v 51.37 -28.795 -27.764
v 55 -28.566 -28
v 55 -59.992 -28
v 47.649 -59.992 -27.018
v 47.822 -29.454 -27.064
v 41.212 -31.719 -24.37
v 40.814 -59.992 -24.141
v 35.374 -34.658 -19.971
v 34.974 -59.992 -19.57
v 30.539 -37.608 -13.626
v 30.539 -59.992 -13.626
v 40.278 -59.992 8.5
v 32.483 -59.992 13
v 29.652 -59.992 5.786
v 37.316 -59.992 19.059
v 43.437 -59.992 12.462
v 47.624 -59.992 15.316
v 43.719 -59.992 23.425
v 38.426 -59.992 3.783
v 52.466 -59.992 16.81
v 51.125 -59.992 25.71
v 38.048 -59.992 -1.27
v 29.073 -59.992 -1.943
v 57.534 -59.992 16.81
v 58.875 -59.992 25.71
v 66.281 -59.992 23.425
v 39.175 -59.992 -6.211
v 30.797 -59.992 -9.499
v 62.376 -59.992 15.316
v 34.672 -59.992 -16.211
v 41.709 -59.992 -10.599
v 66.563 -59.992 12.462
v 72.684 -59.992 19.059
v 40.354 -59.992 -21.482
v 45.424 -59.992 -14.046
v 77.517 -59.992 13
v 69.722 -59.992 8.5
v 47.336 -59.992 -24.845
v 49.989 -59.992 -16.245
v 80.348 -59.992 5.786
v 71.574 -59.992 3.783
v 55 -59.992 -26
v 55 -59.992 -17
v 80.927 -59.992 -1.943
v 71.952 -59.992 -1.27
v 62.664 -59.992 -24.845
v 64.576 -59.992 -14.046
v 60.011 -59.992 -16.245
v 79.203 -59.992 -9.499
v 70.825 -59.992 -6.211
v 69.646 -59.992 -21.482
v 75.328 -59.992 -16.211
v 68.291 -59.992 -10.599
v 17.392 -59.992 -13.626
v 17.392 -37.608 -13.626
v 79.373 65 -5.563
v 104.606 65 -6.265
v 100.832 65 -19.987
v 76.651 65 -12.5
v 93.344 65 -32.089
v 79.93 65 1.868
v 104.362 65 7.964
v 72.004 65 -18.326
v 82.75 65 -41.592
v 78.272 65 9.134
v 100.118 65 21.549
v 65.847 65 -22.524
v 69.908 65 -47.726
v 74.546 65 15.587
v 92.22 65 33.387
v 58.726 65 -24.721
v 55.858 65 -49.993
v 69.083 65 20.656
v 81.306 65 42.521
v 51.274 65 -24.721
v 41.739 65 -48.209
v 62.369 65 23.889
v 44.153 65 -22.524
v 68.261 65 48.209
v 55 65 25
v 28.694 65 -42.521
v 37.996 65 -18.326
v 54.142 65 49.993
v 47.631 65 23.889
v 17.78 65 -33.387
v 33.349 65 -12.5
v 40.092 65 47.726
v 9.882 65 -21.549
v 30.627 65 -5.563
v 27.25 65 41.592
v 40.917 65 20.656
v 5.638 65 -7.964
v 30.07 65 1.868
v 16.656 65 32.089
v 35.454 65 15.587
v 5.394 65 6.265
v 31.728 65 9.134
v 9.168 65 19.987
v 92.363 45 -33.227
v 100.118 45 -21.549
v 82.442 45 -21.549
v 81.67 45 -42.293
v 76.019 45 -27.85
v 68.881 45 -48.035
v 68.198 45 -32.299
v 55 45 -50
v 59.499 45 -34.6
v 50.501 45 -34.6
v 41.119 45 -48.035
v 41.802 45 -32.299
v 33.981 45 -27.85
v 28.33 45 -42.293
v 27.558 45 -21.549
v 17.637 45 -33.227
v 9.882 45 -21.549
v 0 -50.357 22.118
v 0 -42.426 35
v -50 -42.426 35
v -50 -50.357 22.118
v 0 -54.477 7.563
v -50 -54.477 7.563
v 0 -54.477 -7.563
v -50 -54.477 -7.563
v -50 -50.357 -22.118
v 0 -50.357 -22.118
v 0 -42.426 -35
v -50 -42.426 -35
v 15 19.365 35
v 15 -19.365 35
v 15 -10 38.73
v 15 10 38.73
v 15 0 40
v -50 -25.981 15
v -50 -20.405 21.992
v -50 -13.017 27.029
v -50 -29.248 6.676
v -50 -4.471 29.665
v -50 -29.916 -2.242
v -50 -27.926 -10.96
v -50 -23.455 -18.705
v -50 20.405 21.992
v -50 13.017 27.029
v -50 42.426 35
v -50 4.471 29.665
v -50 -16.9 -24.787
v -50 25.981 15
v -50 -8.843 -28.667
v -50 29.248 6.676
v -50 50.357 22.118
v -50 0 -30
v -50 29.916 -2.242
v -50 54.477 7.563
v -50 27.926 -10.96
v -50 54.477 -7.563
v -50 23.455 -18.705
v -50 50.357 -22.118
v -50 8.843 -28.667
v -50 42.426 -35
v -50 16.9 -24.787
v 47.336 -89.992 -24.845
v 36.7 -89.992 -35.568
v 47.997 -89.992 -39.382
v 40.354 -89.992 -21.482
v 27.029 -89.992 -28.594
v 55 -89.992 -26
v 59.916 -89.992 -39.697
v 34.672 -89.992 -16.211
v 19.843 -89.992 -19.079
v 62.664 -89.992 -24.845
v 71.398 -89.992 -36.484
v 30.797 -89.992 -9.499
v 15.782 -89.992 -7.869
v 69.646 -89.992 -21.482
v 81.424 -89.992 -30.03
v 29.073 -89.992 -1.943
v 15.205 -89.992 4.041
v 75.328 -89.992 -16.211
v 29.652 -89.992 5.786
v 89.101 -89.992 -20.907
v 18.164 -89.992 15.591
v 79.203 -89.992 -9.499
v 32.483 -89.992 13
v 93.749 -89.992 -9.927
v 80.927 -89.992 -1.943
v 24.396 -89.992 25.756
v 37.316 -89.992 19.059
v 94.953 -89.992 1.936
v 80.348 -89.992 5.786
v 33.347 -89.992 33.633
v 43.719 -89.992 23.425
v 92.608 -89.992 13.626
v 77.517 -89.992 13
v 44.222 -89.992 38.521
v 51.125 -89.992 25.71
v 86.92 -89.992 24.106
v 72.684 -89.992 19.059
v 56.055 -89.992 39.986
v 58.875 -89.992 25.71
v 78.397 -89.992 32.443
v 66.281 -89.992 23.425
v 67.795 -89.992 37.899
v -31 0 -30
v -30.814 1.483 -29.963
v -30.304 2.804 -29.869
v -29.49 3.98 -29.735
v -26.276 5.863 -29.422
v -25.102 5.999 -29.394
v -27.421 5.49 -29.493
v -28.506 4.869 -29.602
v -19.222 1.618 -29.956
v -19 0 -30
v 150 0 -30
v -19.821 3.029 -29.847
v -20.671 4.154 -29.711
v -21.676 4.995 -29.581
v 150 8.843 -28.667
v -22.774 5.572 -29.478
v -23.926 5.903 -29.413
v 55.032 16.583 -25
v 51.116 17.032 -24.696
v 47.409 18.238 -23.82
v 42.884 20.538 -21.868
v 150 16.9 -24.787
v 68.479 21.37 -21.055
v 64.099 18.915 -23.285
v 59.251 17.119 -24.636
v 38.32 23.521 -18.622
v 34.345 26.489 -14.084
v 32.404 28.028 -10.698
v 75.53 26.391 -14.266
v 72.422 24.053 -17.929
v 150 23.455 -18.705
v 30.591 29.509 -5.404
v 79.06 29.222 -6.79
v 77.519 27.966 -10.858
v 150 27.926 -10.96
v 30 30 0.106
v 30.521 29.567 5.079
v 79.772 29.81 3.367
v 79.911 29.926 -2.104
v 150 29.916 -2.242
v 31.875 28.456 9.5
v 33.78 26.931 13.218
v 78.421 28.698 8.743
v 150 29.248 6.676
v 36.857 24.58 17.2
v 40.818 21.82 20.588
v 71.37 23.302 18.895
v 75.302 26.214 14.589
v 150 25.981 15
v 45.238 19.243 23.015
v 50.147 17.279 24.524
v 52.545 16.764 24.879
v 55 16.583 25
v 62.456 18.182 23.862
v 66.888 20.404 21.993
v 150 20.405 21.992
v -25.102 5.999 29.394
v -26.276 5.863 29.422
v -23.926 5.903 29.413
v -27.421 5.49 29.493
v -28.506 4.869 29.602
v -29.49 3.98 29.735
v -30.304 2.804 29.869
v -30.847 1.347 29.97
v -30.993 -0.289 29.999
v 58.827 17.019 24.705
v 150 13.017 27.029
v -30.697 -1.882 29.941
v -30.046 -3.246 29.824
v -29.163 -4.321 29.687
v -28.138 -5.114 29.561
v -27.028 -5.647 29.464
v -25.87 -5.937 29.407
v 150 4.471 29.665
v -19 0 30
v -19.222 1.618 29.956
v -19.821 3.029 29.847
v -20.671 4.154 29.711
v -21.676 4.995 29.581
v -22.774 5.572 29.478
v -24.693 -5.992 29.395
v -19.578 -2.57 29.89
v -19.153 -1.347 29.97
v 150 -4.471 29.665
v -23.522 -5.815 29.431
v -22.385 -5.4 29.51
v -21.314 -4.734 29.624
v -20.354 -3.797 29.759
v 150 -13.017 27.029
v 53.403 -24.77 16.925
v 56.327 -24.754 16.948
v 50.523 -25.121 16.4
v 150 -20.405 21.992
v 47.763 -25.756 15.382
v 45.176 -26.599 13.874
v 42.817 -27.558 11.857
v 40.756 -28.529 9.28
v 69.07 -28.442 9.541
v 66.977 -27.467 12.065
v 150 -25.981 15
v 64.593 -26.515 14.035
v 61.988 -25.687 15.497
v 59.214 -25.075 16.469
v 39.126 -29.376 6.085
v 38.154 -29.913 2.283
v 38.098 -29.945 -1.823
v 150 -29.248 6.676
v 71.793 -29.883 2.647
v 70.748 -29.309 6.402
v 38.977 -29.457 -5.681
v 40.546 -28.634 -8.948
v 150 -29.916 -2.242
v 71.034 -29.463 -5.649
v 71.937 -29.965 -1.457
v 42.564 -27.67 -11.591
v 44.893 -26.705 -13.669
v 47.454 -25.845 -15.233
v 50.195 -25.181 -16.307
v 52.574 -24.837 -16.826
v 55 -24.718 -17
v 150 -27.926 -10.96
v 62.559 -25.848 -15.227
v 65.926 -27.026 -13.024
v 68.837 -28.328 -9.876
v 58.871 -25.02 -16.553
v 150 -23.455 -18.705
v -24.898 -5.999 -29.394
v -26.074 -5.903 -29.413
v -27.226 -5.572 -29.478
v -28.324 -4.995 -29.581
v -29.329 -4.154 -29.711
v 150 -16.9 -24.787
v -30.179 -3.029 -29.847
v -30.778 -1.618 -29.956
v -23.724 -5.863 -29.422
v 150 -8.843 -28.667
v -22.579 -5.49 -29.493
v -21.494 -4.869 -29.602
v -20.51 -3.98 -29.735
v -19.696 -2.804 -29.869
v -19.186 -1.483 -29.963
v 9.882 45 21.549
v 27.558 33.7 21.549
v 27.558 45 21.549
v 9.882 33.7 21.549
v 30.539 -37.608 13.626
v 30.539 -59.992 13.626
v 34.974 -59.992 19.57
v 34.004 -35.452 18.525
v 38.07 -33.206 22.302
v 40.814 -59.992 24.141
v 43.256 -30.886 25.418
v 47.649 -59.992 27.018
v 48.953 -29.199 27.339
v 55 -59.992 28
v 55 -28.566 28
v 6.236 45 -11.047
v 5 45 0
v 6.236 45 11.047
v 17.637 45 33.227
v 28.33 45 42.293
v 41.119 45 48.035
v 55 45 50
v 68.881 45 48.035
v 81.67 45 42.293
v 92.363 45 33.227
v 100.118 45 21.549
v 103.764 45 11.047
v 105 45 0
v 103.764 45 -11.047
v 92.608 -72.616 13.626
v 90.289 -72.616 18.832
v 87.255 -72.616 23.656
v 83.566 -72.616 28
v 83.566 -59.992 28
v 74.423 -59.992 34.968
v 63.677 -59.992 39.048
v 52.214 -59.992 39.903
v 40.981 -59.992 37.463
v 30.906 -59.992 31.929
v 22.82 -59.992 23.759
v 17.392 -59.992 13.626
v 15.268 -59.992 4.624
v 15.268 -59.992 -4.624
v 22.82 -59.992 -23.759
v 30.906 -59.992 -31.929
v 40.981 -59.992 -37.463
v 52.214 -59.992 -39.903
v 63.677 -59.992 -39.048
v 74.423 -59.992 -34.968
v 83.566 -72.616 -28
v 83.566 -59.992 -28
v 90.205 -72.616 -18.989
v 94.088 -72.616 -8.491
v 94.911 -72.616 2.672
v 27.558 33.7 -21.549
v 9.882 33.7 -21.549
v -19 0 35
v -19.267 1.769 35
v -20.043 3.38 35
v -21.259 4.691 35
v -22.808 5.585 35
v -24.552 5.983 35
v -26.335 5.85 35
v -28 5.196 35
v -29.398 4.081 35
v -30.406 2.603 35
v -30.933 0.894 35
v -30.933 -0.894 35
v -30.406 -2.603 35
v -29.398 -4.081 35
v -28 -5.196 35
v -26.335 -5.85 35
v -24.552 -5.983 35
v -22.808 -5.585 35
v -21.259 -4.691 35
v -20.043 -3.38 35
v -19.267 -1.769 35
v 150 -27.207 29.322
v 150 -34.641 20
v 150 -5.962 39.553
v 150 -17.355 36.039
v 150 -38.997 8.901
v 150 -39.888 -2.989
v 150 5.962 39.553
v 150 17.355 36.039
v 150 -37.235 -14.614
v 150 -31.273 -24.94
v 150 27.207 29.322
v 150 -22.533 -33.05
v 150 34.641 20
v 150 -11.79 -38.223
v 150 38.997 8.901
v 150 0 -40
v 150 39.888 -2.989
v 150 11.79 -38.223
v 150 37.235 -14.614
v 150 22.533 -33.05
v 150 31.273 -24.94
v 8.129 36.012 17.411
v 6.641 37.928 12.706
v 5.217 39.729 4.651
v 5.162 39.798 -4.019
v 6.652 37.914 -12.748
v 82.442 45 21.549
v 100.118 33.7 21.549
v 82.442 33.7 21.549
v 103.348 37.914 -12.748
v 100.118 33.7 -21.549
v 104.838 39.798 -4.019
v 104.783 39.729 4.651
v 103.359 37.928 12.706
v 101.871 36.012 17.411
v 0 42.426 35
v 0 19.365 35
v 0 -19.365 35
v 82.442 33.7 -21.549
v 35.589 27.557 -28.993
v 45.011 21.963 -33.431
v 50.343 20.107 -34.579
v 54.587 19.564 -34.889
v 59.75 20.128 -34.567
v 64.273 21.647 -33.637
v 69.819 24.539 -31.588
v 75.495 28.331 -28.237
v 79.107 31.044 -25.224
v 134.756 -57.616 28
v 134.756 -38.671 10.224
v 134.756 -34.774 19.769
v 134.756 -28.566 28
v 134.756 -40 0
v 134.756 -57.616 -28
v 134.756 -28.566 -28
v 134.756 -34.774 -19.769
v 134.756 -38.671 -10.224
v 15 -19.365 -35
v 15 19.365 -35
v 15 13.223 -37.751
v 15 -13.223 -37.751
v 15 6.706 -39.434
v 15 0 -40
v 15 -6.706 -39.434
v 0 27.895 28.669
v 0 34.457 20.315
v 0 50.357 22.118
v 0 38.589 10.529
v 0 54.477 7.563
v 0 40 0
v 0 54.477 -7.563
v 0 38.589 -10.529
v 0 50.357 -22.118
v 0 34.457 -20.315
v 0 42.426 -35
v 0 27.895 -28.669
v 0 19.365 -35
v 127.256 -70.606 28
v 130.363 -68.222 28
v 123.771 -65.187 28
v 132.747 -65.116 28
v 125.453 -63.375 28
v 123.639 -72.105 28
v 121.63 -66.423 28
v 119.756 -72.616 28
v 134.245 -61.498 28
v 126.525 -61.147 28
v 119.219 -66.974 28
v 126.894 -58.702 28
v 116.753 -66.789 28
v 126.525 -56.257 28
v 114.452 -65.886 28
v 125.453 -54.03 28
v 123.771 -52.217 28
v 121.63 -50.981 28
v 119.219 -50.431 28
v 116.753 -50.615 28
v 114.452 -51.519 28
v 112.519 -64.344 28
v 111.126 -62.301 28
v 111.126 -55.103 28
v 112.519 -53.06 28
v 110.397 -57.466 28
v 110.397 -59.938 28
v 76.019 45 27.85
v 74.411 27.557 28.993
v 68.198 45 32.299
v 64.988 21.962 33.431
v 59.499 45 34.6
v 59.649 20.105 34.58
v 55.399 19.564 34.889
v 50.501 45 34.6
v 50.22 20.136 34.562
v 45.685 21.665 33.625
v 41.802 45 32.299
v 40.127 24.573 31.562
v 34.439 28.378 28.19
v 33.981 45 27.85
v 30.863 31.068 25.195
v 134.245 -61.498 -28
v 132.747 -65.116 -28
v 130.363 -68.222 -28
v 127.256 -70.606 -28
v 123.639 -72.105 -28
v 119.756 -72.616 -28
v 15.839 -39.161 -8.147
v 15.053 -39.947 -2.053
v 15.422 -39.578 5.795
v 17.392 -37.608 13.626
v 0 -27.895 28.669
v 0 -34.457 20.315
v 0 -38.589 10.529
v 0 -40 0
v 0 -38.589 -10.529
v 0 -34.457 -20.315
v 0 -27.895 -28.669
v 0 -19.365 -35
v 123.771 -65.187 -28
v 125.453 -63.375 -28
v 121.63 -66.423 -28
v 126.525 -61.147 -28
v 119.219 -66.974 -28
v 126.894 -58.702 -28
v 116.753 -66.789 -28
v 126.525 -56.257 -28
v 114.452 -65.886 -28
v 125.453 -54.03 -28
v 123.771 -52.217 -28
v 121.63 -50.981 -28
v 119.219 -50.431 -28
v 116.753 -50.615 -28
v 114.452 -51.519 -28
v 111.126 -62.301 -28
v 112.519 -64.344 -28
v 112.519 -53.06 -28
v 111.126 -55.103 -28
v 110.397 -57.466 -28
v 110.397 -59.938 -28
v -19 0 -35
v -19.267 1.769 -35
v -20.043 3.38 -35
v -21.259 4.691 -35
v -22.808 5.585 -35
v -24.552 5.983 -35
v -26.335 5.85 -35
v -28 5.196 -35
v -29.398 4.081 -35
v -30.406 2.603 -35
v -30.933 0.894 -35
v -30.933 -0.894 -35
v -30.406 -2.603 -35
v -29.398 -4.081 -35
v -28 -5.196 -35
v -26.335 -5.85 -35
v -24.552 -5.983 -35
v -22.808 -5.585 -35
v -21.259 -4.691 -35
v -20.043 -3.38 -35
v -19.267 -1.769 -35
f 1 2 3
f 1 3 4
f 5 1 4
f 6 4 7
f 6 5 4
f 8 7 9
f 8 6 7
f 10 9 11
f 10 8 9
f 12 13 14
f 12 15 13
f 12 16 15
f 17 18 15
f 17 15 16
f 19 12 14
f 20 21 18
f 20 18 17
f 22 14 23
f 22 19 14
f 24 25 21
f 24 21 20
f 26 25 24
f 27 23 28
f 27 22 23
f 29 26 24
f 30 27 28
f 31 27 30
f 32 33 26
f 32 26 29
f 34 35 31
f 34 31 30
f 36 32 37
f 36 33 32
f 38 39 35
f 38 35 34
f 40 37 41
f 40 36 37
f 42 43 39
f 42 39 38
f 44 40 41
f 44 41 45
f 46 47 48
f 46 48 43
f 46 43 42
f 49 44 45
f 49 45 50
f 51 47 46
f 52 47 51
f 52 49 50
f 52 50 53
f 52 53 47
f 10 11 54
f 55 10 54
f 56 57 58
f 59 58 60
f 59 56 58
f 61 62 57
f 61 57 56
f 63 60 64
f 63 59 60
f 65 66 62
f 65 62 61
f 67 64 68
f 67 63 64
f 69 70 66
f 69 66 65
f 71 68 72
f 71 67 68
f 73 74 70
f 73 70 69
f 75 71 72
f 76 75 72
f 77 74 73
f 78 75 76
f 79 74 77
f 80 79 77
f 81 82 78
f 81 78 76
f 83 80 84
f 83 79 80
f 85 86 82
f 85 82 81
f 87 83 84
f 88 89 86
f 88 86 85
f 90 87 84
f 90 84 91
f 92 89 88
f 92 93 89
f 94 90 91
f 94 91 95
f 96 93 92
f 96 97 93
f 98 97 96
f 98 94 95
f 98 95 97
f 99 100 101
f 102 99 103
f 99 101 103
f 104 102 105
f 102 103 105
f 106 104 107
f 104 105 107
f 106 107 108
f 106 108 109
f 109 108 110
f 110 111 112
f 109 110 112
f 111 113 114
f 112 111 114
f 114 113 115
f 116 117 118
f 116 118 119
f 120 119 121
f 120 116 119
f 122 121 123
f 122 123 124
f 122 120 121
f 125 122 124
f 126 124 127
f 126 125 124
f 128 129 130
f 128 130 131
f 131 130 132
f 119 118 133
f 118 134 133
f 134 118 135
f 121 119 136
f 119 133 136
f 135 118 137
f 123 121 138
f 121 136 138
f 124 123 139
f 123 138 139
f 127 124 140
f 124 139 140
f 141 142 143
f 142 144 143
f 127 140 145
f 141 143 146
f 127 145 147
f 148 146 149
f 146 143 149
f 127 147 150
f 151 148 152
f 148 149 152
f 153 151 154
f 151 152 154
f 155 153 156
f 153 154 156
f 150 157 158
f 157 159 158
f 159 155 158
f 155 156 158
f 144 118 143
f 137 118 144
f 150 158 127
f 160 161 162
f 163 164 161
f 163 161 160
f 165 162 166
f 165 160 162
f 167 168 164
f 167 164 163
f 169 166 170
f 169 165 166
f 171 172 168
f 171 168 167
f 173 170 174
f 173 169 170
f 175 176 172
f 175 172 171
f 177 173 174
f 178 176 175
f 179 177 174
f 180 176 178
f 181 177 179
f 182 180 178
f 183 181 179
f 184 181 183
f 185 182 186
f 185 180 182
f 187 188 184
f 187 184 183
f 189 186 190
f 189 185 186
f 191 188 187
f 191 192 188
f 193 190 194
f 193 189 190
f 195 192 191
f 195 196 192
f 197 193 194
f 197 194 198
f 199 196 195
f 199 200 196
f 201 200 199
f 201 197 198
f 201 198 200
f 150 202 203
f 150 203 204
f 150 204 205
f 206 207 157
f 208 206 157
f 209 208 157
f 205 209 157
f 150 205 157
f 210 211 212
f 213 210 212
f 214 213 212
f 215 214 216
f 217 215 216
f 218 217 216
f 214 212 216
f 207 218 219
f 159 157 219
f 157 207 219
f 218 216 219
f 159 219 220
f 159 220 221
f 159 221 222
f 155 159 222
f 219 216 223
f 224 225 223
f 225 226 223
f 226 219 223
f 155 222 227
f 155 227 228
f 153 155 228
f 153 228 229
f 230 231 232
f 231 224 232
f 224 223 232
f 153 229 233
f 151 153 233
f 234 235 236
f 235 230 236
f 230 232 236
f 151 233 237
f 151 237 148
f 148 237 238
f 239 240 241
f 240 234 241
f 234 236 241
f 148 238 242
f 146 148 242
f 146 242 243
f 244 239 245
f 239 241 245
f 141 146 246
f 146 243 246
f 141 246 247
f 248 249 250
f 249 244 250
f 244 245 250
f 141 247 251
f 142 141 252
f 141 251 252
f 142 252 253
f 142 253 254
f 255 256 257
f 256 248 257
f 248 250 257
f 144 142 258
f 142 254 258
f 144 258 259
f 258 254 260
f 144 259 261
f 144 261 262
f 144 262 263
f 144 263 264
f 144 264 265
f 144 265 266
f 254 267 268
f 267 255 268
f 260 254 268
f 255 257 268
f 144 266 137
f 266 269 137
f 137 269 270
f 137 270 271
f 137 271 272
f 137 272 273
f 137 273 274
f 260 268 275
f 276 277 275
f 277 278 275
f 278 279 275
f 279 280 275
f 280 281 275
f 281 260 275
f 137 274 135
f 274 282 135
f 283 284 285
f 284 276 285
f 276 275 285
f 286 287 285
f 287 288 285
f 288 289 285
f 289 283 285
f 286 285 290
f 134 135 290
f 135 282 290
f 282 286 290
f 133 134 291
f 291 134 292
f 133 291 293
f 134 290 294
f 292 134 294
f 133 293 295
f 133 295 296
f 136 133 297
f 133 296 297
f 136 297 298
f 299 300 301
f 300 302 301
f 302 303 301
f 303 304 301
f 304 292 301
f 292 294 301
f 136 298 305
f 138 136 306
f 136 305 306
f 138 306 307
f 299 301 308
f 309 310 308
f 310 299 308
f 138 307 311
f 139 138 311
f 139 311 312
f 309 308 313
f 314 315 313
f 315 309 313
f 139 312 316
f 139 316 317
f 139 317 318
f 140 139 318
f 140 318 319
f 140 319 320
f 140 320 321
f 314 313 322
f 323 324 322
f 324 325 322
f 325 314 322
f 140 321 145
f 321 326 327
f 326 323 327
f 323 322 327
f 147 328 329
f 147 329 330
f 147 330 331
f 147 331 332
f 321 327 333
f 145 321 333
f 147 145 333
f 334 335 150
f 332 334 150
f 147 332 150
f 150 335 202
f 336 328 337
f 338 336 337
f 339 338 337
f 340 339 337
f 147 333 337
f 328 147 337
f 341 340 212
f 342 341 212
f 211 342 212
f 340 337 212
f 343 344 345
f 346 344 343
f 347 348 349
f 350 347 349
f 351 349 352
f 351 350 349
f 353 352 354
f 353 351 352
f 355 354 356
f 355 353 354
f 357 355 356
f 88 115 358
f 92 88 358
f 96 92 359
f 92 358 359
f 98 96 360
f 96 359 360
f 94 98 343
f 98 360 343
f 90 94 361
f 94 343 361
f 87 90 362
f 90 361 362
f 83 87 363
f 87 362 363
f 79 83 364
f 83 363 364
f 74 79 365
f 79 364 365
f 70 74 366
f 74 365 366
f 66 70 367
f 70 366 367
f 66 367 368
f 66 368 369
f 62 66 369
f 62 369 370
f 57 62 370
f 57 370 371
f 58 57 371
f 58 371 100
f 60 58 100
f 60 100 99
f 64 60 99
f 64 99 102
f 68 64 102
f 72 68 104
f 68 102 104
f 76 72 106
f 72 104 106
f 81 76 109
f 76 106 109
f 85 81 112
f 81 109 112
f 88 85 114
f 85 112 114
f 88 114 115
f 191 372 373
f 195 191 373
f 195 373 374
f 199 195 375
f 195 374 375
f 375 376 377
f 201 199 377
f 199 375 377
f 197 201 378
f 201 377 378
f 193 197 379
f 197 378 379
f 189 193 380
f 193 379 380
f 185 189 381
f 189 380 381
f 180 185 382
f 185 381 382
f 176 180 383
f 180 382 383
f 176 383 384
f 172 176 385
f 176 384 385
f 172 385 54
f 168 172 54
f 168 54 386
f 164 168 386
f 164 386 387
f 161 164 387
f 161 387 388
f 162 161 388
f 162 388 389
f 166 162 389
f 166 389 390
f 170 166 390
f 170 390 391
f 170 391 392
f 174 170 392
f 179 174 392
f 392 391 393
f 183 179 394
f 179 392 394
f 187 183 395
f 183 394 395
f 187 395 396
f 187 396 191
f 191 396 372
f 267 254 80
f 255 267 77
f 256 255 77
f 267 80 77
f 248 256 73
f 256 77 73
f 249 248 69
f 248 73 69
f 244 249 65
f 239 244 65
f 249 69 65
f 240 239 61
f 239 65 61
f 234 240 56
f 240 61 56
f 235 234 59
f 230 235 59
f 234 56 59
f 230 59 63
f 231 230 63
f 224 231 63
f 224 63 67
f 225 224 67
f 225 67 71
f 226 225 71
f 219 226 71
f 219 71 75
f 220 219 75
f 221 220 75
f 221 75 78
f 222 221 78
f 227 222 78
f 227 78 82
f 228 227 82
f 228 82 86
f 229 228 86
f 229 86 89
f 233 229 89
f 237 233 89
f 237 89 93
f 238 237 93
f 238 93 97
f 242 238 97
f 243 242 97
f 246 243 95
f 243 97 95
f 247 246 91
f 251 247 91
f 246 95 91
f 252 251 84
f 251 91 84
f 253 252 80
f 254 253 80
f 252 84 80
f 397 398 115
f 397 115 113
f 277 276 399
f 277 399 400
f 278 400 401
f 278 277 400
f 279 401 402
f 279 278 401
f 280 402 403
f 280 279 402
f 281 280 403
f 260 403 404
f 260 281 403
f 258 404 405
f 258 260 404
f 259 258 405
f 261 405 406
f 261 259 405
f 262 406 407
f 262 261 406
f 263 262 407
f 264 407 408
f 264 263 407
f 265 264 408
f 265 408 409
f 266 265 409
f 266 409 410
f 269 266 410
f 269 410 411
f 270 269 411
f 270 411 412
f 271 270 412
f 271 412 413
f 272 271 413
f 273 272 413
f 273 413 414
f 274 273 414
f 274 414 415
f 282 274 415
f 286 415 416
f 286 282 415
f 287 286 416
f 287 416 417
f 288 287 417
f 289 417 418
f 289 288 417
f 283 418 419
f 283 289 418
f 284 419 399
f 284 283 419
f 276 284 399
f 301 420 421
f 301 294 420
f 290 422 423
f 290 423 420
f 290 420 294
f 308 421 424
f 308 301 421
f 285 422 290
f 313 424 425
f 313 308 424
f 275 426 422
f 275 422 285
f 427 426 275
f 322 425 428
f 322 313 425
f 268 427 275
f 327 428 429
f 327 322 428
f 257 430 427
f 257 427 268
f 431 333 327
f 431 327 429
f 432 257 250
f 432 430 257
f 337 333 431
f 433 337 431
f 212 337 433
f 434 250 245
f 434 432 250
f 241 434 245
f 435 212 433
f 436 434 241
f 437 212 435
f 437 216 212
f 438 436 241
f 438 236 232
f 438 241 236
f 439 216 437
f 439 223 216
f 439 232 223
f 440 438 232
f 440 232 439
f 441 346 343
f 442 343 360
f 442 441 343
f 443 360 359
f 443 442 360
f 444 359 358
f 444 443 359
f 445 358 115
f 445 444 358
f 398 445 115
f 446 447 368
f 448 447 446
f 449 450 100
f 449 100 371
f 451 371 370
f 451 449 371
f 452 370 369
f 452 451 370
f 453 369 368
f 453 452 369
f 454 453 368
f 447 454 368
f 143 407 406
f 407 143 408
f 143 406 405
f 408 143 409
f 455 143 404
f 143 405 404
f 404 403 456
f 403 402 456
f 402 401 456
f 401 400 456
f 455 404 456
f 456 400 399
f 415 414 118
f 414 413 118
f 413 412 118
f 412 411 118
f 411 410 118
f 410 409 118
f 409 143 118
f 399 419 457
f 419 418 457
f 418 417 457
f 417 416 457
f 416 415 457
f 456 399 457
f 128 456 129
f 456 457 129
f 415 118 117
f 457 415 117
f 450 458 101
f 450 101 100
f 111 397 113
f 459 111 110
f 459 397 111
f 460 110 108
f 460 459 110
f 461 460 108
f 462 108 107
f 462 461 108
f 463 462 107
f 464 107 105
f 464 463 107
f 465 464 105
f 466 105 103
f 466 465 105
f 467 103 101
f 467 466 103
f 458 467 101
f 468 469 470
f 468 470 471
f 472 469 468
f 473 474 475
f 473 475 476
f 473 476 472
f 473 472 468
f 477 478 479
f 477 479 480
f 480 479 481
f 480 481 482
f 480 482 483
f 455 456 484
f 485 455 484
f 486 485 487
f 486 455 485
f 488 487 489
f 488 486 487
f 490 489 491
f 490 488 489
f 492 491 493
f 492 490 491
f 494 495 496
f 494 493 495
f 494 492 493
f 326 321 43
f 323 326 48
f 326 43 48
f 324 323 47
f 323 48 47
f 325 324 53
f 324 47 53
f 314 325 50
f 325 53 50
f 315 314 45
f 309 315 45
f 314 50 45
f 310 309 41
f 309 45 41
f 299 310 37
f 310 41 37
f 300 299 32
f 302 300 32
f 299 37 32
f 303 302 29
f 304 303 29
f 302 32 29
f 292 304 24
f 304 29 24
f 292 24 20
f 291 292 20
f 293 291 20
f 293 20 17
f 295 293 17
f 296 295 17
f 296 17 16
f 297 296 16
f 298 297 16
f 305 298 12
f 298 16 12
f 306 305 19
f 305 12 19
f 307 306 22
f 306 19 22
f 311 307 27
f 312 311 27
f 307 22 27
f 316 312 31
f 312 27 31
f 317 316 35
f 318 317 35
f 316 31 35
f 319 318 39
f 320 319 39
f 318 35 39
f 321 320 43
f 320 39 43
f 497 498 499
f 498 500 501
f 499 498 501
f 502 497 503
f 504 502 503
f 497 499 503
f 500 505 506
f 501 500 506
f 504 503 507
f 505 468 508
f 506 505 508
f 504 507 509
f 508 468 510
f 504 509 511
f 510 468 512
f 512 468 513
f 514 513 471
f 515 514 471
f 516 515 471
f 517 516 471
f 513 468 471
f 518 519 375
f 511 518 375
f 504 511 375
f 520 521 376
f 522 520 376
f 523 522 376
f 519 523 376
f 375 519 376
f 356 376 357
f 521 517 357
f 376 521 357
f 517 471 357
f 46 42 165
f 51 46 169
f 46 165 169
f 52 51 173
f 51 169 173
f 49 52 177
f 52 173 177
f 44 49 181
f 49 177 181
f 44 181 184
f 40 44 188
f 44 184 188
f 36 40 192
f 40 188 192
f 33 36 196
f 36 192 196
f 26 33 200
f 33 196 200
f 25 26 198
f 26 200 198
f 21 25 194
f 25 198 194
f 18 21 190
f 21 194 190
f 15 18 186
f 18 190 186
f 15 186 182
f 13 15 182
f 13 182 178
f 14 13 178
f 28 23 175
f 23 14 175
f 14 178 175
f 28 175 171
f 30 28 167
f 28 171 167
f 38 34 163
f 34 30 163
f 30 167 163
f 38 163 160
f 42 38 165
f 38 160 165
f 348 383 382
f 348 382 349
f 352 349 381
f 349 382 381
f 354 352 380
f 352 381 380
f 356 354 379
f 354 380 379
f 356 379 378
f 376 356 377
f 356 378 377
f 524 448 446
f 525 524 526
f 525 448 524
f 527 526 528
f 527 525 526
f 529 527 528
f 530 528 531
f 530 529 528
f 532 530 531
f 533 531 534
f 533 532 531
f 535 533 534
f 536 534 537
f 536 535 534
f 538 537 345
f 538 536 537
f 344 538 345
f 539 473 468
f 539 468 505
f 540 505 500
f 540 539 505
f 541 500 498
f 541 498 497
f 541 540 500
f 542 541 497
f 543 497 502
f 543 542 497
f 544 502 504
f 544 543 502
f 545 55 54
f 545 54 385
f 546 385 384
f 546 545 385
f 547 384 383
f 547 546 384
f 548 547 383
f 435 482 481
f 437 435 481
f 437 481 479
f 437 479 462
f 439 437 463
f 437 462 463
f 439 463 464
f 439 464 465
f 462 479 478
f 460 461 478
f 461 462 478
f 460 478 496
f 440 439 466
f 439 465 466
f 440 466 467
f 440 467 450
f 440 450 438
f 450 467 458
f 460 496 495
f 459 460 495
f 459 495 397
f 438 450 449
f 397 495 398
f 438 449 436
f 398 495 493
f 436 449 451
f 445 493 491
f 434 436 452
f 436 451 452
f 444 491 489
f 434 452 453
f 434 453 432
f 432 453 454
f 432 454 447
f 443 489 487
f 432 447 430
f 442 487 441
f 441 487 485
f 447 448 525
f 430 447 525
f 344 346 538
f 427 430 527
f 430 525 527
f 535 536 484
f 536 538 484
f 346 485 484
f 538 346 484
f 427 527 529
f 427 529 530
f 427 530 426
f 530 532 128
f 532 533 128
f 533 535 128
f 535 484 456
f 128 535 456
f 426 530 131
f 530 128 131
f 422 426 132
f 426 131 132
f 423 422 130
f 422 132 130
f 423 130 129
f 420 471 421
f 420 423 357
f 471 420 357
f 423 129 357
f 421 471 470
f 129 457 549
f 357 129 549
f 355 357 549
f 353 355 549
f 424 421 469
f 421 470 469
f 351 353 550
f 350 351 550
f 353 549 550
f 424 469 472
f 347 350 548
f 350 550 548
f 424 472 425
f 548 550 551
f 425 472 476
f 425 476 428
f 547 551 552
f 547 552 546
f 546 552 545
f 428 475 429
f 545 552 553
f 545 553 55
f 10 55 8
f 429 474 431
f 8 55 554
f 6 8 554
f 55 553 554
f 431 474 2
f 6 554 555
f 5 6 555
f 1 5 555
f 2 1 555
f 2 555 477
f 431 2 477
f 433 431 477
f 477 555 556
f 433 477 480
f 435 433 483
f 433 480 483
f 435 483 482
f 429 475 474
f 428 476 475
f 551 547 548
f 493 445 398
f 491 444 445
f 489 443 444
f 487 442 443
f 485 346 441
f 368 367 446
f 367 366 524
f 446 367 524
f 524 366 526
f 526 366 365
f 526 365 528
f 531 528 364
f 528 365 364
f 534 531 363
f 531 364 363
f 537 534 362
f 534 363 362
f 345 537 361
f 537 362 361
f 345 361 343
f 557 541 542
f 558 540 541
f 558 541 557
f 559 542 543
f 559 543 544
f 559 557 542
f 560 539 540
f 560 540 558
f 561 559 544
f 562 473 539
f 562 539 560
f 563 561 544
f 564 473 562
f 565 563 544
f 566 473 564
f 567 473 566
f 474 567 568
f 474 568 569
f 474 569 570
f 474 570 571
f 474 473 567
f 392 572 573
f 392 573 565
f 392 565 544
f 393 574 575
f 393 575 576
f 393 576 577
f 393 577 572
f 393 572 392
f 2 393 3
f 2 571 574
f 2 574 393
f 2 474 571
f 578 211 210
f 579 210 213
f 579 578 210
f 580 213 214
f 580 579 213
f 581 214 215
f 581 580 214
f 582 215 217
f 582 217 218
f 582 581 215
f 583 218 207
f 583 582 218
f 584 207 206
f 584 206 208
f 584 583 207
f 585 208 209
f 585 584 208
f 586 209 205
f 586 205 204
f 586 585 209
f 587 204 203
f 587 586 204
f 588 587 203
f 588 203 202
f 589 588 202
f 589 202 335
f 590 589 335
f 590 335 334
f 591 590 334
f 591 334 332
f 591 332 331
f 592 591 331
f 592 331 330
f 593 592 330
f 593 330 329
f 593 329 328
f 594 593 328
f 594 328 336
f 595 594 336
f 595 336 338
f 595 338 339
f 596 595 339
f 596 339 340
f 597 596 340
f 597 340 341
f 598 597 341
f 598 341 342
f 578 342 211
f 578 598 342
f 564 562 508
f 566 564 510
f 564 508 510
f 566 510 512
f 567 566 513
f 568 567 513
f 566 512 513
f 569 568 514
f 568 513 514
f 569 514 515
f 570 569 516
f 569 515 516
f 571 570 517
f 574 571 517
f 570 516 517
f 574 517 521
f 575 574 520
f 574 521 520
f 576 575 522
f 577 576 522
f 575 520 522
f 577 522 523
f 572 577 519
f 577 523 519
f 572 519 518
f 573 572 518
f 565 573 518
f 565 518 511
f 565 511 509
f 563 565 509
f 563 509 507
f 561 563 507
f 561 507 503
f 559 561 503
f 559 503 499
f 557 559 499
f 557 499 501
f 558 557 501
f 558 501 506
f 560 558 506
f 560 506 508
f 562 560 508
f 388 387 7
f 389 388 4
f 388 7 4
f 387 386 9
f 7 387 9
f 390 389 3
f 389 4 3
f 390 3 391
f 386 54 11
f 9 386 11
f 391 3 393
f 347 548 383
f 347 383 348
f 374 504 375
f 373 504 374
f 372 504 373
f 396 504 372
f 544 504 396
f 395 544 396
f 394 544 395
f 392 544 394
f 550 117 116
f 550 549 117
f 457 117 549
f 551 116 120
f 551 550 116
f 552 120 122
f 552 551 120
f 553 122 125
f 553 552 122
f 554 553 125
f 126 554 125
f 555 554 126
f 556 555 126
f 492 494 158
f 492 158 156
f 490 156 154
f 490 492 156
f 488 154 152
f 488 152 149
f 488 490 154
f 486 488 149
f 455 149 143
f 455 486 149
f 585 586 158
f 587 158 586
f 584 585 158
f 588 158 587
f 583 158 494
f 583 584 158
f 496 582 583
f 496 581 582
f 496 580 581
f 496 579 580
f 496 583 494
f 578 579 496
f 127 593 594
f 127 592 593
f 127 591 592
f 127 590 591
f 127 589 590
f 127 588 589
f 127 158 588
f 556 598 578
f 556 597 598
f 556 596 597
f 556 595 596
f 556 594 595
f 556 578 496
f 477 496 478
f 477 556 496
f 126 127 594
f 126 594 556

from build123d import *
from build123d.topology import SkipClean

# Parameters (mm, degrees)
SKETCH_1_R                       = 40
EXTRUDE_1_DEPTH                  = 150
SKETCH_2_R                       = 55
EXTRUDE_2_DEPTH                  = 50
SKETCH_3_R                       = 30
CUT_EXTRUDE_2_DEPTH              = 200
CUT_EXTRUDE_3_DEPTH              = 134
CUT_EXTRUDE_3_DEPTH_BACK         = 106
SKETCH_5_R                       = 6
EXTRUDE_3_DEPTH                  = 45
SKETCH_15_R                      = 50
EXTRUDE_5_DEPTH                  = 20
EXTRUDE_6_DEPTH                  = 59.991870163
SKETCH_17_R                      = 40
EXTRUDE_7_DEPTH                  = 30
SKETCH_18_R                      = 26
CUT_EXTRUDE_25_DEPTH             = 30
SKETCH_19_R                      = 17
CUT_EXTRUDE_26_DEPTH             = 51
CUT_EXTRUDE_27_DEPTH             = 170
CUT_EXTRUDE_27_DEPTH_BACK        = 99
SKETCH_20_R                      = 30
SKETCH_21_R                      = 25
CUT_EXTRUDE_28_DEPTH             = 60
EXTRUDE_8_DEPTH                  = 28
EXTRUDE_8_DEPTH_BACK             = 28
SKETCH_23_R                      = 8.294671539
CUT_EXTRUDE_29_DEPTH             = 70
CUT_EXTRUDE_30_REACH             = 185.367
CUT_EXTRUDE_30_END_RADIUS        = 55
SKETCH_24_W                      = 85
SKETCH_24_H                      = 25
CUT_EXTRUDE_30_DIRECTION_2_DEPTH = 70
CUT_EXTRUDE_31_DEPTH             = 70
CUT_EXTRUDE_31_DEPTH_BACK        = 70
SKETCH_25_W                      = 85
SKETCH_25_H                      = 25
SKETCH_26_R                      = 26
CUT_EXTRUDE_32_DEPTH             = 30
SKETCH_27_R                      = 17
CUT_EXTRUDE_33_DEPTH             = 55
CUT_EXTRUDE_34_DEPTH             = 417
CUT_EXTRUDE_34_DEPTH_BACK        = 195
SKETCH_29_R                      = 30


with BuildPart() as part:
    # 草图1 → 凸台-拉伸1 (new body)
    with BuildSketch(Plane(origin=(0, 0, 0), x_dir=(0, 0, -1), z_dir=(1, 0, 0))):
        Circle(SKETCH_1_R)
    extrude(amount=EXTRUDE_1_DEPTH)

    # 草图2 → 凸台-拉伸2 (add)
    with BuildSketch(Plane(origin=(0, 0, 0), x_dir=(0, 0, -1), z_dir=(1, 0, 0))):
        Circle(SKETCH_2_R)
    extrude(amount=-EXTRUDE_2_DEPTH)

    # 草图3 → 切除-拉伸2 (cut)
    with BuildSketch(Plane(origin=(150, 0, 0), x_dir=(0, 0, -1), z_dir=(1, 0, 0))):
        Circle(SKETCH_3_R)
    extrude(amount=-CUT_EXTRUDE_2_DEPTH, mode=Mode.SUBTRACT)

    # 草图5 → 切除-拉伸3 (cut, two sides: drawn at the far end of the back side and taken through both)
    with BuildSketch(Plane.XY.offset(-CUT_EXTRUDE_3_DEPTH_BACK)):
        with Locations((-25, 0)):
            Circle(SKETCH_5_R)
    extrude(amount=CUT_EXTRUDE_3_DEPTH + CUT_EXTRUDE_3_DEPTH_BACK, mode=Mode.SUBTRACT)

    # 草图7 → 凸台-拉伸3 (add)
    with BuildSketch(Plane(origin=(0, 0, 0), x_dir=(1, 0, 0), z_dir=(0, 1, 0))):
        with BuildLine():
            Line((82.442023832, 21.548591956), (100.118268858, 21.548591956))
            ThreePointArc((100.118268858, 21.548591956), (105, 0), (100.118268858, -21.548591956))
            Line((100.118268858, -21.548591956), (82.442023832, -21.548591956))
            ThreePointArc((82.442023832, -21.548591956), (55, -34.891352615), (27.557976168, -21.548591956))
            Line((27.557976168, -21.548591956), (9.881731142, -21.548591956))
            ThreePointArc((9.881731142, -21.548591956), (5, 0), (9.881731142, 21.548591956))
            Line((9.881731142, 21.548591956), (27.557976168, 21.548591956))
            ThreePointArc((27.557976168, 21.548591956), (55, 34.891352615), (82.442023832, 21.548591956))
        make_face()
    extrude(amount=EXTRUDE_3_DEPTH)

    # 草图15 → 凸台-拉伸5 (add)
    with SkipClean():  # the faces are left unmerged after this step: merging them gives an invalid solid
        with BuildSketch(Plane(origin=(0, 45, 0), x_dir=(1, 0, 0), z_dir=(0, 1, 0))):
            with Locations(Location((55, 0, 0), (0, 0, 154.470748686))):
                Circle(SKETCH_15_R)
        extrude(amount=EXTRUDE_5_DEPTH)

    # 草图16 → 凸台-拉伸6 (add)
    with SkipClean():  # the faces are left unmerged after this step: merging them gives an invalid solid
        with BuildSketch(Plane(origin=(0, 0, 0), x_dir=(1, 0, 0), z_dir=(0, 1, 0))):
            with BuildLine():
                Line((30.539216555, 13.626080627), (17.392421951, 13.626080627))
                ThreePointArc((17.392421951, 13.626080627), (15, 0), (17.392421951, -13.626080627))
                Line((17.392421951, -13.626080627), (30.539216555, -13.626080627))
                ThreePointArc((30.539216555, -13.626080627), (55, -28), (79.460783445, -13.626080627))
                Line((79.460783445, -13.626080627), (92.607578049, -13.626080627))
                ThreePointArc((92.607578049, -13.626080627), (95, 0), (92.607578049, 13.626080627))
                Line((92.607578049, 13.626080627), (79.460783445, 13.626080627))
                ThreePointArc((79.460783445, 13.626080627), (55, 28), (30.539216555, 13.626080627))
            make_face()
        extrude(amount=-EXTRUDE_6_DEPTH)

    # 草图17 → 凸台-拉伸7 (add)
    with BuildSketch(Plane.XZ.offset(59.991870163)):
        with Locations(Location((55, 0, 0), (0, 0, 19.916603358))):
            Circle(SKETCH_17_R)
    extrude(amount=EXTRUDE_7_DEPTH)

    # 草图18 → 切除-拉伸25 (cut)
    with BuildSketch(Plane.XZ.offset(89.991870163)):
        with Locations(Location((55, 0, 0), (0, 0, 270))):
            Circle(SKETCH_18_R)
    extrude(amount=-CUT_EXTRUDE_25_DEPTH, mode=Mode.SUBTRACT)

    # 草图19 → 切除-拉伸26 (cut)
    with BuildSketch(Plane.XZ.offset(59.991870163)):
        with Locations(Location((55, 0, 0), (0, 0, 270))):
            Circle(SKETCH_19_R)
    extrude(amount=-CUT_EXTRUDE_26_DEPTH, mode=Mode.SUBTRACT)

    # 草图20 → 切除-拉伸27 (cut, two sides: drawn at the far end of the back side and taken through both)
    with BuildSketch(Plane(origin=(0, 0, 0), x_dir=(0, 0, -1), z_dir=(1, 0, 0)).offset(-CUT_EXTRUDE_27_DEPTH_BACK)):
        Circle(SKETCH_20_R)
    extrude(amount=CUT_EXTRUDE_27_DEPTH + CUT_EXTRUDE_27_DEPTH_BACK, mode=Mode.SUBTRACT)

    # 草图21 → 切除-拉伸28 (cut)
    with BuildSketch(Plane(origin=(0, 65, 0), x_dir=(1, 0, 0), z_dir=(0, 1, 0))):
        with Locations(Location((55, 0, 0), (0, 0, 270))):
            Circle(SKETCH_21_R)
    extrude(amount=-CUT_EXTRUDE_28_DEPTH, mode=Mode.SUBTRACT)

    # 草图22 → 凸台-拉伸8 (add, two sides: drawn at the far end of the back side and taken through both)
    with BuildSketch(Plane.XY.offset(-EXTRUDE_8_DEPTH_BACK)):
        with BuildLine():
            Line((119.756495452, -72.615787856), (55, -72.615787856))
            Line((55, -72.615787856), (55, -17.615787856))
            Line((55, -17.615787856), (134.756495452, -17.615787856))
            Line((134.756495452, -17.615787856), (134.756495452, -57.615787856))
            ThreePointArc((134.756495452, -57.615787856), (130.36309717, -68.222389574), (119.756495452, -72.615787856))
        make_face()
    extrude(amount=EXTRUDE_8_DEPTH + EXTRUDE_8_DEPTH_BACK)

    # 草图23 → 切除-拉伸29 (cut)
    with BuildSketch(Plane.XY.offset(28)):
        with Locations((118.599166742, -58.702167389)):
            Circle(SKETCH_23_R)
    extrude(amount=-CUT_EXTRUDE_29_DEPTH, mode=Mode.SUBTRACT)

    # 切除-拉伸30: up to this cylinder (the profile starts inside it)
    cut_extrude_30_end = Plane(origin=(-27.5, 0, 0), z_dir=(1, 0, 0)) * Cylinder(CUT_EXTRUDE_30_END_RADIUS, 481.734, mode=Mode.PRIVATE)
    # 草图24 → 切除-拉伸30 (cut, up to the surface)
    with BuildSketch(Plane(origin=(0, 0, 0), x_dir=(1, 0, 0), z_dir=(0, 1, 0)), mode=Mode.PRIVATE) as cut_extrude_30_sk1:
        with Locations((-27.5, -47.5)):
            Rectangle(SKETCH_24_W, SKETCH_24_H)
    cut_extrude_30_tool1 = extrude(cut_extrude_30_sk1.sketch, amount=-CUT_EXTRUDE_30_REACH, mode=Mode.PRIVATE) & cut_extrude_30_end
    add(cut_extrude_30_tool1.solids().sort_by_distance((-27.5, 0, 47.5))[0], mode=Mode.SUBTRACT)

    # 草图24 → 切除-拉伸30 direction 2 (cut)
    with BuildSketch(Plane(origin=(0, 0, 0), x_dir=(1, 0, 0), z_dir=(0, 1, 0))):
        with Locations((-27.5, -47.5)):
            Rectangle(SKETCH_24_W, SKETCH_24_H)
    extrude(amount=CUT_EXTRUDE_30_DIRECTION_2_DEPTH, mode=Mode.SUBTRACT)

    # 草图25 → 切除-拉伸31 (cut, two sides: drawn at the far end of the back side and taken through both)
    with BuildSketch(Plane(origin=(0, 0, 0), x_dir=(1, 0, 0), z_dir=(0, 1, 0)).offset(-CUT_EXTRUDE_31_DEPTH_BACK)):
        with Locations((-27.5, 47.5)):
            Rectangle(SKETCH_25_W, SKETCH_25_H)
    extrude(amount=CUT_EXTRUDE_31_DEPTH + CUT_EXTRUDE_31_DEPTH_BACK, mode=Mode.SUBTRACT)

    # 草图26 → 切除-拉伸32 (cut)
    with BuildSketch(Plane.XZ.offset(89.991870163)):
        with Locations(Location((55, 0, 0), (0, 0, 270))):
            Circle(SKETCH_26_R)
    extrude(amount=-CUT_EXTRUDE_32_DEPTH, mode=Mode.SUBTRACT)

    # 草图27 → 切除-拉伸33 (cut)
    with BuildSketch(Plane.XZ.offset(59.991870163)):
        with Locations(Location((55, 0, 0), (0, 0, 270))):
            Circle(SKETCH_27_R)
    extrude(amount=-CUT_EXTRUDE_33_DEPTH, mode=Mode.SUBTRACT)

    # 草图29 → 切除-拉伸34 (cut, two sides: drawn at the far end of the back side and taken through both)
    with BuildSketch(Plane(origin=(0, 0, 0), x_dir=(0, 0, -1), z_dir=(1, 0, 0)).offset(-CUT_EXTRUDE_34_DEPTH_BACK)):
        Circle(SKETCH_29_R)
    extrude(amount=CUT_EXTRUDE_34_DEPTH + CUT_EXTRUDE_34_DEPTH_BACK, mode=Mode.SUBTRACT)


solid = part.part
